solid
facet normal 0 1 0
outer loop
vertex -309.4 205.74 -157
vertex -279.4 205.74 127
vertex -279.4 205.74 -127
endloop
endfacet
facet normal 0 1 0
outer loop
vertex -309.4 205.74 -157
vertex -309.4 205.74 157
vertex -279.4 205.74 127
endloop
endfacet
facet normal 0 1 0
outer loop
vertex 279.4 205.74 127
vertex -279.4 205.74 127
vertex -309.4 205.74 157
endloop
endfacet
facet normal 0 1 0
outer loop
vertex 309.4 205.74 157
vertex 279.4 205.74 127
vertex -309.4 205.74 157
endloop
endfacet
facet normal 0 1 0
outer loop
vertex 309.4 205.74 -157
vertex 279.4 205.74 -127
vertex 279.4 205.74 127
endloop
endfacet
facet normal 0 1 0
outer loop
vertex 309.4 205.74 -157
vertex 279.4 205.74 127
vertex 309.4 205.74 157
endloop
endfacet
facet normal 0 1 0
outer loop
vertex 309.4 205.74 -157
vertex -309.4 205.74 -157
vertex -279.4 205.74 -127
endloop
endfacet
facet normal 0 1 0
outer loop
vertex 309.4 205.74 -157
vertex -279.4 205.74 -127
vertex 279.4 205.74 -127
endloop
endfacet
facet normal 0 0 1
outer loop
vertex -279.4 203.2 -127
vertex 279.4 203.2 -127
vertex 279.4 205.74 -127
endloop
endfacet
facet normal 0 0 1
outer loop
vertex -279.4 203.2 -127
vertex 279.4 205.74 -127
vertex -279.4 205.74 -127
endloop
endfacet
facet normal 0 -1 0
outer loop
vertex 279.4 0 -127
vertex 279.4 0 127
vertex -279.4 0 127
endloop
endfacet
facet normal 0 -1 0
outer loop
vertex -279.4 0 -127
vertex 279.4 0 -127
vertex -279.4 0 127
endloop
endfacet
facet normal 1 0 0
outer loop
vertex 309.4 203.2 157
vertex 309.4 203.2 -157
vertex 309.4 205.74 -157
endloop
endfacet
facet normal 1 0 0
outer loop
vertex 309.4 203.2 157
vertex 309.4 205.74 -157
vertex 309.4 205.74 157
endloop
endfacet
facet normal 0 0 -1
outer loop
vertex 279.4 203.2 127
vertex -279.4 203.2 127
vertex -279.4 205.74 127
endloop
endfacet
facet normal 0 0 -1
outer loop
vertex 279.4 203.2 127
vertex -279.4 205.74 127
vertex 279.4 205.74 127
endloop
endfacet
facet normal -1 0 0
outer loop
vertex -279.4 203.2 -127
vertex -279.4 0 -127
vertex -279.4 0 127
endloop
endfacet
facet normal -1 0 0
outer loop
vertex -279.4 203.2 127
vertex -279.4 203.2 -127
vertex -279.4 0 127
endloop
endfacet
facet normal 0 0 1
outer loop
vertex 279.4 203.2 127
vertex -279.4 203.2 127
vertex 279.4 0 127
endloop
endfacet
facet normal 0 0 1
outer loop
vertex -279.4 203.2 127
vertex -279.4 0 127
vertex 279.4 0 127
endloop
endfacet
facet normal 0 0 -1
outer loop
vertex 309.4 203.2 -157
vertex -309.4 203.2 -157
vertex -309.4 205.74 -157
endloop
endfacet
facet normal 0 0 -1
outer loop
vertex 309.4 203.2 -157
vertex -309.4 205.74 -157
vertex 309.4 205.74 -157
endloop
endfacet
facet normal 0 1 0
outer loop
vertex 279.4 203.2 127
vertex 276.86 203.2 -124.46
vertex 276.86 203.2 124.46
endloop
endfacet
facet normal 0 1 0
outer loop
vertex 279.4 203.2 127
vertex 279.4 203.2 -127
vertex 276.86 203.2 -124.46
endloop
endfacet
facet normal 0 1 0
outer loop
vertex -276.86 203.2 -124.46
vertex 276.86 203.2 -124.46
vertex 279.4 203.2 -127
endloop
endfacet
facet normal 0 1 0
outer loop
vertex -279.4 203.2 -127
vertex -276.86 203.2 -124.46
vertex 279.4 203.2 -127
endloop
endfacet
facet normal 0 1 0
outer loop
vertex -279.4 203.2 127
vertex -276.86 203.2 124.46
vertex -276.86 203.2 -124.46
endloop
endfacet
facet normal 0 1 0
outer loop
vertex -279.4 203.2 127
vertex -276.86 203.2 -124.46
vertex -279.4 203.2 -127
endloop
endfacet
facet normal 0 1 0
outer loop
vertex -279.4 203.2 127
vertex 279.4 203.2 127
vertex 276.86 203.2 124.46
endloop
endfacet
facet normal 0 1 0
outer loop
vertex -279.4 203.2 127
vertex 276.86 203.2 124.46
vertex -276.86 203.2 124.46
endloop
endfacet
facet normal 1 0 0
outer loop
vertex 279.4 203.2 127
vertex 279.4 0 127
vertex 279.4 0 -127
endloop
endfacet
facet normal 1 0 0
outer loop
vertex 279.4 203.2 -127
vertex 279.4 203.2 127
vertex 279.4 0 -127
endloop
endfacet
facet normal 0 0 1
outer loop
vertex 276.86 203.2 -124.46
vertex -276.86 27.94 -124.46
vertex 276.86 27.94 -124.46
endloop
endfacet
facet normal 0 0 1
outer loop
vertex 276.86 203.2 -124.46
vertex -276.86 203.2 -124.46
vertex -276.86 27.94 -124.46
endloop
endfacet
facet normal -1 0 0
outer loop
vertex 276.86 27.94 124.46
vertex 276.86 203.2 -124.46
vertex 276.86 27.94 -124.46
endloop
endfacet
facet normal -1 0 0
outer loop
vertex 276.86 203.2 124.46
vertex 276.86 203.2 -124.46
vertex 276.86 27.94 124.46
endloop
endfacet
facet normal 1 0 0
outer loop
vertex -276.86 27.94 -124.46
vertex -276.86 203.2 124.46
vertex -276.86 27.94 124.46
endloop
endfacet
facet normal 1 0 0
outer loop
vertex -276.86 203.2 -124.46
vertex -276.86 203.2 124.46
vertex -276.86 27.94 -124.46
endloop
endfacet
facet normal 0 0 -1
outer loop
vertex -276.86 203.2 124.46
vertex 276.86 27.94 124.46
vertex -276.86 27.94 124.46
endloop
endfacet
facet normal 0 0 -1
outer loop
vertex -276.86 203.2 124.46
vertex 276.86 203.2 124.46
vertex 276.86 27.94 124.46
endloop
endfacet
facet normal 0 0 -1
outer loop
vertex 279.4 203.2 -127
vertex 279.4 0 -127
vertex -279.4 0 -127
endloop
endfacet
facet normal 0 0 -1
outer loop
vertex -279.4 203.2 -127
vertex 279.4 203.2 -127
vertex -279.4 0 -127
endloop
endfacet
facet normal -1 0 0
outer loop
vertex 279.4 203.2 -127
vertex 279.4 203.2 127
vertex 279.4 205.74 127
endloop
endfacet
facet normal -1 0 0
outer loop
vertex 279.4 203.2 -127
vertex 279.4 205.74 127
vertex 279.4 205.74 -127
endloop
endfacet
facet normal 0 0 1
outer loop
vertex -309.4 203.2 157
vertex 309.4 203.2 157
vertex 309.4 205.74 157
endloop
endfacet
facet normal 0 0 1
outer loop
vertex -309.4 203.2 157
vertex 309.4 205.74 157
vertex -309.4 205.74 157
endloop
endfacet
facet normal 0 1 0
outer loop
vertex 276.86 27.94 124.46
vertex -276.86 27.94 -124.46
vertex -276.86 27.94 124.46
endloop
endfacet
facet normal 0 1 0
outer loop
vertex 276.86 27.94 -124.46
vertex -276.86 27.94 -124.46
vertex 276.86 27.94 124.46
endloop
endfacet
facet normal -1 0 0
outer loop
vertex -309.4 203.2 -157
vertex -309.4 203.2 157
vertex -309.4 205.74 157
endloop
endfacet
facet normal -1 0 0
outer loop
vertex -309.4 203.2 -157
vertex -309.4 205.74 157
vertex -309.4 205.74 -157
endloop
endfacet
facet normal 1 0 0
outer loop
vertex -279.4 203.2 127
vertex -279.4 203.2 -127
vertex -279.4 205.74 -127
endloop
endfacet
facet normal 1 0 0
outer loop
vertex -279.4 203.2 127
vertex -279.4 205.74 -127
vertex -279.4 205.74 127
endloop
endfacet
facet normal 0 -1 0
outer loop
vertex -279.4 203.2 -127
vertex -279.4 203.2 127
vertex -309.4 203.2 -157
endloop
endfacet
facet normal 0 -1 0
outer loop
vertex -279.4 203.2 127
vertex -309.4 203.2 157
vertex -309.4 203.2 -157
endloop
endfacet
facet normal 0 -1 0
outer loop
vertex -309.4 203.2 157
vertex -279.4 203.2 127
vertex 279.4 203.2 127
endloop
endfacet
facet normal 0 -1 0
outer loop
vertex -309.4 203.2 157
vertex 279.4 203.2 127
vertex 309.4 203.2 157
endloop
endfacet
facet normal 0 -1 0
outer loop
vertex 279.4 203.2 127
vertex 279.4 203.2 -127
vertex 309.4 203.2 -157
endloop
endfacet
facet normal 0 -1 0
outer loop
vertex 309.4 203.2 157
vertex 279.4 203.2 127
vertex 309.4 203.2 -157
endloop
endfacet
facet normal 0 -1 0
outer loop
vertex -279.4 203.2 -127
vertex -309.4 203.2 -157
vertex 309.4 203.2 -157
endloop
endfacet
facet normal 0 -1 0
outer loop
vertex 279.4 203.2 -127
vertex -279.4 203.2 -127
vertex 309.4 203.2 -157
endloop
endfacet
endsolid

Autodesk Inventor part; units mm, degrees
ref_plane "YZ Plane" through (0, 0, 0) normal (1, 0, 0) x (0, 1, 0)
ref_plane "XZ Plane" through (0, 0, 0) normal (0, 1, 0) x (-1, 0, 0)
ref_plane "XY Plane" through (0, 0, 0) normal (0, 0, 1) x (1, 0, 0)
sketch "Sketch1" plane through (0, 0, 0) normal (0, 1, 0) x (-1, 0, 0)
  line L0 (-279.4, -127) -> (279.4, -127)
  line L1 (279.4, -127) -> (279.4, 127)
  line L2 (279.4, 127) -> (-279.4, 127)
  line L3 (-279.4, 127) -> (-279.4, -127)
  line L4 (-279.4, -127) -> (279.4, 127) construction
  line L5 (279.4, -127) -> (-279.4, 127) construction
  point P0 (0, 0)
  dimension "d0" = 558.8
  dimension "d1" = 254
extrude "Extrusion1" add sketch "Sketch1" along normal blind 203.2
sketch "Sketch2" plane through (0, 203.2, 0) normal (0, 1, 0) x (1, 0, 0)
  line L0 (279.4, 127) -> (-279.4, 127) projected
  line L1 (-279.4, 127) -> (-279.4, -127) projected
  line L2 (-279.4, -127) -> (279.4, -127) projected
  line L3 (279.4, -127) -> (279.4, 127) projected
  line L4 (-309.4, 157) -> (309.4, 157)
  line L5 (309.4, 157) -> (309.4, -157)
  line L6 (309.4, -157) -> (-309.4, -157)
  line L7 (-309.4, -157) -> (-309.4, 157)
  point P0 (0, 0)
  dimension "d4" = 30
extrude "Extrusion2" add sketch "Sketch2" along normal blind 2.54
sketch "Sketch4" plane through (0, 203.2, 0) normal (0, 1, 0) x (1, 0, 0)
  line L0 (279.4, 127) -> (-279.4, 127) projected
  line L1 (-279.4, 127) -> (-279.4, -127) projected
  line L2 (-279.4, -127) -> (279.4, -127) projected
  line L3 (279.4, -127) -> (279.4, 127) projected
  line L4 (-276.86, 124.46) -> (276.86, 124.46)
  line L5 (276.86, 124.46) -> (276.86, -124.46)
  line L6 (276.86, -124.46) -> (-276.86, -124.46)
  line L7 (-276.86, -124.46) -> (-276.86, 124.46)
  point P0 (0, 0)
  dimension "d9" = 2.54
extrude "Extrusion4" cut sketch "Sketch4" against normal blind 175.26 contours L4 L5 L6 L7
properties part number "dcps_mcpc" material "Copper, Alloy"
